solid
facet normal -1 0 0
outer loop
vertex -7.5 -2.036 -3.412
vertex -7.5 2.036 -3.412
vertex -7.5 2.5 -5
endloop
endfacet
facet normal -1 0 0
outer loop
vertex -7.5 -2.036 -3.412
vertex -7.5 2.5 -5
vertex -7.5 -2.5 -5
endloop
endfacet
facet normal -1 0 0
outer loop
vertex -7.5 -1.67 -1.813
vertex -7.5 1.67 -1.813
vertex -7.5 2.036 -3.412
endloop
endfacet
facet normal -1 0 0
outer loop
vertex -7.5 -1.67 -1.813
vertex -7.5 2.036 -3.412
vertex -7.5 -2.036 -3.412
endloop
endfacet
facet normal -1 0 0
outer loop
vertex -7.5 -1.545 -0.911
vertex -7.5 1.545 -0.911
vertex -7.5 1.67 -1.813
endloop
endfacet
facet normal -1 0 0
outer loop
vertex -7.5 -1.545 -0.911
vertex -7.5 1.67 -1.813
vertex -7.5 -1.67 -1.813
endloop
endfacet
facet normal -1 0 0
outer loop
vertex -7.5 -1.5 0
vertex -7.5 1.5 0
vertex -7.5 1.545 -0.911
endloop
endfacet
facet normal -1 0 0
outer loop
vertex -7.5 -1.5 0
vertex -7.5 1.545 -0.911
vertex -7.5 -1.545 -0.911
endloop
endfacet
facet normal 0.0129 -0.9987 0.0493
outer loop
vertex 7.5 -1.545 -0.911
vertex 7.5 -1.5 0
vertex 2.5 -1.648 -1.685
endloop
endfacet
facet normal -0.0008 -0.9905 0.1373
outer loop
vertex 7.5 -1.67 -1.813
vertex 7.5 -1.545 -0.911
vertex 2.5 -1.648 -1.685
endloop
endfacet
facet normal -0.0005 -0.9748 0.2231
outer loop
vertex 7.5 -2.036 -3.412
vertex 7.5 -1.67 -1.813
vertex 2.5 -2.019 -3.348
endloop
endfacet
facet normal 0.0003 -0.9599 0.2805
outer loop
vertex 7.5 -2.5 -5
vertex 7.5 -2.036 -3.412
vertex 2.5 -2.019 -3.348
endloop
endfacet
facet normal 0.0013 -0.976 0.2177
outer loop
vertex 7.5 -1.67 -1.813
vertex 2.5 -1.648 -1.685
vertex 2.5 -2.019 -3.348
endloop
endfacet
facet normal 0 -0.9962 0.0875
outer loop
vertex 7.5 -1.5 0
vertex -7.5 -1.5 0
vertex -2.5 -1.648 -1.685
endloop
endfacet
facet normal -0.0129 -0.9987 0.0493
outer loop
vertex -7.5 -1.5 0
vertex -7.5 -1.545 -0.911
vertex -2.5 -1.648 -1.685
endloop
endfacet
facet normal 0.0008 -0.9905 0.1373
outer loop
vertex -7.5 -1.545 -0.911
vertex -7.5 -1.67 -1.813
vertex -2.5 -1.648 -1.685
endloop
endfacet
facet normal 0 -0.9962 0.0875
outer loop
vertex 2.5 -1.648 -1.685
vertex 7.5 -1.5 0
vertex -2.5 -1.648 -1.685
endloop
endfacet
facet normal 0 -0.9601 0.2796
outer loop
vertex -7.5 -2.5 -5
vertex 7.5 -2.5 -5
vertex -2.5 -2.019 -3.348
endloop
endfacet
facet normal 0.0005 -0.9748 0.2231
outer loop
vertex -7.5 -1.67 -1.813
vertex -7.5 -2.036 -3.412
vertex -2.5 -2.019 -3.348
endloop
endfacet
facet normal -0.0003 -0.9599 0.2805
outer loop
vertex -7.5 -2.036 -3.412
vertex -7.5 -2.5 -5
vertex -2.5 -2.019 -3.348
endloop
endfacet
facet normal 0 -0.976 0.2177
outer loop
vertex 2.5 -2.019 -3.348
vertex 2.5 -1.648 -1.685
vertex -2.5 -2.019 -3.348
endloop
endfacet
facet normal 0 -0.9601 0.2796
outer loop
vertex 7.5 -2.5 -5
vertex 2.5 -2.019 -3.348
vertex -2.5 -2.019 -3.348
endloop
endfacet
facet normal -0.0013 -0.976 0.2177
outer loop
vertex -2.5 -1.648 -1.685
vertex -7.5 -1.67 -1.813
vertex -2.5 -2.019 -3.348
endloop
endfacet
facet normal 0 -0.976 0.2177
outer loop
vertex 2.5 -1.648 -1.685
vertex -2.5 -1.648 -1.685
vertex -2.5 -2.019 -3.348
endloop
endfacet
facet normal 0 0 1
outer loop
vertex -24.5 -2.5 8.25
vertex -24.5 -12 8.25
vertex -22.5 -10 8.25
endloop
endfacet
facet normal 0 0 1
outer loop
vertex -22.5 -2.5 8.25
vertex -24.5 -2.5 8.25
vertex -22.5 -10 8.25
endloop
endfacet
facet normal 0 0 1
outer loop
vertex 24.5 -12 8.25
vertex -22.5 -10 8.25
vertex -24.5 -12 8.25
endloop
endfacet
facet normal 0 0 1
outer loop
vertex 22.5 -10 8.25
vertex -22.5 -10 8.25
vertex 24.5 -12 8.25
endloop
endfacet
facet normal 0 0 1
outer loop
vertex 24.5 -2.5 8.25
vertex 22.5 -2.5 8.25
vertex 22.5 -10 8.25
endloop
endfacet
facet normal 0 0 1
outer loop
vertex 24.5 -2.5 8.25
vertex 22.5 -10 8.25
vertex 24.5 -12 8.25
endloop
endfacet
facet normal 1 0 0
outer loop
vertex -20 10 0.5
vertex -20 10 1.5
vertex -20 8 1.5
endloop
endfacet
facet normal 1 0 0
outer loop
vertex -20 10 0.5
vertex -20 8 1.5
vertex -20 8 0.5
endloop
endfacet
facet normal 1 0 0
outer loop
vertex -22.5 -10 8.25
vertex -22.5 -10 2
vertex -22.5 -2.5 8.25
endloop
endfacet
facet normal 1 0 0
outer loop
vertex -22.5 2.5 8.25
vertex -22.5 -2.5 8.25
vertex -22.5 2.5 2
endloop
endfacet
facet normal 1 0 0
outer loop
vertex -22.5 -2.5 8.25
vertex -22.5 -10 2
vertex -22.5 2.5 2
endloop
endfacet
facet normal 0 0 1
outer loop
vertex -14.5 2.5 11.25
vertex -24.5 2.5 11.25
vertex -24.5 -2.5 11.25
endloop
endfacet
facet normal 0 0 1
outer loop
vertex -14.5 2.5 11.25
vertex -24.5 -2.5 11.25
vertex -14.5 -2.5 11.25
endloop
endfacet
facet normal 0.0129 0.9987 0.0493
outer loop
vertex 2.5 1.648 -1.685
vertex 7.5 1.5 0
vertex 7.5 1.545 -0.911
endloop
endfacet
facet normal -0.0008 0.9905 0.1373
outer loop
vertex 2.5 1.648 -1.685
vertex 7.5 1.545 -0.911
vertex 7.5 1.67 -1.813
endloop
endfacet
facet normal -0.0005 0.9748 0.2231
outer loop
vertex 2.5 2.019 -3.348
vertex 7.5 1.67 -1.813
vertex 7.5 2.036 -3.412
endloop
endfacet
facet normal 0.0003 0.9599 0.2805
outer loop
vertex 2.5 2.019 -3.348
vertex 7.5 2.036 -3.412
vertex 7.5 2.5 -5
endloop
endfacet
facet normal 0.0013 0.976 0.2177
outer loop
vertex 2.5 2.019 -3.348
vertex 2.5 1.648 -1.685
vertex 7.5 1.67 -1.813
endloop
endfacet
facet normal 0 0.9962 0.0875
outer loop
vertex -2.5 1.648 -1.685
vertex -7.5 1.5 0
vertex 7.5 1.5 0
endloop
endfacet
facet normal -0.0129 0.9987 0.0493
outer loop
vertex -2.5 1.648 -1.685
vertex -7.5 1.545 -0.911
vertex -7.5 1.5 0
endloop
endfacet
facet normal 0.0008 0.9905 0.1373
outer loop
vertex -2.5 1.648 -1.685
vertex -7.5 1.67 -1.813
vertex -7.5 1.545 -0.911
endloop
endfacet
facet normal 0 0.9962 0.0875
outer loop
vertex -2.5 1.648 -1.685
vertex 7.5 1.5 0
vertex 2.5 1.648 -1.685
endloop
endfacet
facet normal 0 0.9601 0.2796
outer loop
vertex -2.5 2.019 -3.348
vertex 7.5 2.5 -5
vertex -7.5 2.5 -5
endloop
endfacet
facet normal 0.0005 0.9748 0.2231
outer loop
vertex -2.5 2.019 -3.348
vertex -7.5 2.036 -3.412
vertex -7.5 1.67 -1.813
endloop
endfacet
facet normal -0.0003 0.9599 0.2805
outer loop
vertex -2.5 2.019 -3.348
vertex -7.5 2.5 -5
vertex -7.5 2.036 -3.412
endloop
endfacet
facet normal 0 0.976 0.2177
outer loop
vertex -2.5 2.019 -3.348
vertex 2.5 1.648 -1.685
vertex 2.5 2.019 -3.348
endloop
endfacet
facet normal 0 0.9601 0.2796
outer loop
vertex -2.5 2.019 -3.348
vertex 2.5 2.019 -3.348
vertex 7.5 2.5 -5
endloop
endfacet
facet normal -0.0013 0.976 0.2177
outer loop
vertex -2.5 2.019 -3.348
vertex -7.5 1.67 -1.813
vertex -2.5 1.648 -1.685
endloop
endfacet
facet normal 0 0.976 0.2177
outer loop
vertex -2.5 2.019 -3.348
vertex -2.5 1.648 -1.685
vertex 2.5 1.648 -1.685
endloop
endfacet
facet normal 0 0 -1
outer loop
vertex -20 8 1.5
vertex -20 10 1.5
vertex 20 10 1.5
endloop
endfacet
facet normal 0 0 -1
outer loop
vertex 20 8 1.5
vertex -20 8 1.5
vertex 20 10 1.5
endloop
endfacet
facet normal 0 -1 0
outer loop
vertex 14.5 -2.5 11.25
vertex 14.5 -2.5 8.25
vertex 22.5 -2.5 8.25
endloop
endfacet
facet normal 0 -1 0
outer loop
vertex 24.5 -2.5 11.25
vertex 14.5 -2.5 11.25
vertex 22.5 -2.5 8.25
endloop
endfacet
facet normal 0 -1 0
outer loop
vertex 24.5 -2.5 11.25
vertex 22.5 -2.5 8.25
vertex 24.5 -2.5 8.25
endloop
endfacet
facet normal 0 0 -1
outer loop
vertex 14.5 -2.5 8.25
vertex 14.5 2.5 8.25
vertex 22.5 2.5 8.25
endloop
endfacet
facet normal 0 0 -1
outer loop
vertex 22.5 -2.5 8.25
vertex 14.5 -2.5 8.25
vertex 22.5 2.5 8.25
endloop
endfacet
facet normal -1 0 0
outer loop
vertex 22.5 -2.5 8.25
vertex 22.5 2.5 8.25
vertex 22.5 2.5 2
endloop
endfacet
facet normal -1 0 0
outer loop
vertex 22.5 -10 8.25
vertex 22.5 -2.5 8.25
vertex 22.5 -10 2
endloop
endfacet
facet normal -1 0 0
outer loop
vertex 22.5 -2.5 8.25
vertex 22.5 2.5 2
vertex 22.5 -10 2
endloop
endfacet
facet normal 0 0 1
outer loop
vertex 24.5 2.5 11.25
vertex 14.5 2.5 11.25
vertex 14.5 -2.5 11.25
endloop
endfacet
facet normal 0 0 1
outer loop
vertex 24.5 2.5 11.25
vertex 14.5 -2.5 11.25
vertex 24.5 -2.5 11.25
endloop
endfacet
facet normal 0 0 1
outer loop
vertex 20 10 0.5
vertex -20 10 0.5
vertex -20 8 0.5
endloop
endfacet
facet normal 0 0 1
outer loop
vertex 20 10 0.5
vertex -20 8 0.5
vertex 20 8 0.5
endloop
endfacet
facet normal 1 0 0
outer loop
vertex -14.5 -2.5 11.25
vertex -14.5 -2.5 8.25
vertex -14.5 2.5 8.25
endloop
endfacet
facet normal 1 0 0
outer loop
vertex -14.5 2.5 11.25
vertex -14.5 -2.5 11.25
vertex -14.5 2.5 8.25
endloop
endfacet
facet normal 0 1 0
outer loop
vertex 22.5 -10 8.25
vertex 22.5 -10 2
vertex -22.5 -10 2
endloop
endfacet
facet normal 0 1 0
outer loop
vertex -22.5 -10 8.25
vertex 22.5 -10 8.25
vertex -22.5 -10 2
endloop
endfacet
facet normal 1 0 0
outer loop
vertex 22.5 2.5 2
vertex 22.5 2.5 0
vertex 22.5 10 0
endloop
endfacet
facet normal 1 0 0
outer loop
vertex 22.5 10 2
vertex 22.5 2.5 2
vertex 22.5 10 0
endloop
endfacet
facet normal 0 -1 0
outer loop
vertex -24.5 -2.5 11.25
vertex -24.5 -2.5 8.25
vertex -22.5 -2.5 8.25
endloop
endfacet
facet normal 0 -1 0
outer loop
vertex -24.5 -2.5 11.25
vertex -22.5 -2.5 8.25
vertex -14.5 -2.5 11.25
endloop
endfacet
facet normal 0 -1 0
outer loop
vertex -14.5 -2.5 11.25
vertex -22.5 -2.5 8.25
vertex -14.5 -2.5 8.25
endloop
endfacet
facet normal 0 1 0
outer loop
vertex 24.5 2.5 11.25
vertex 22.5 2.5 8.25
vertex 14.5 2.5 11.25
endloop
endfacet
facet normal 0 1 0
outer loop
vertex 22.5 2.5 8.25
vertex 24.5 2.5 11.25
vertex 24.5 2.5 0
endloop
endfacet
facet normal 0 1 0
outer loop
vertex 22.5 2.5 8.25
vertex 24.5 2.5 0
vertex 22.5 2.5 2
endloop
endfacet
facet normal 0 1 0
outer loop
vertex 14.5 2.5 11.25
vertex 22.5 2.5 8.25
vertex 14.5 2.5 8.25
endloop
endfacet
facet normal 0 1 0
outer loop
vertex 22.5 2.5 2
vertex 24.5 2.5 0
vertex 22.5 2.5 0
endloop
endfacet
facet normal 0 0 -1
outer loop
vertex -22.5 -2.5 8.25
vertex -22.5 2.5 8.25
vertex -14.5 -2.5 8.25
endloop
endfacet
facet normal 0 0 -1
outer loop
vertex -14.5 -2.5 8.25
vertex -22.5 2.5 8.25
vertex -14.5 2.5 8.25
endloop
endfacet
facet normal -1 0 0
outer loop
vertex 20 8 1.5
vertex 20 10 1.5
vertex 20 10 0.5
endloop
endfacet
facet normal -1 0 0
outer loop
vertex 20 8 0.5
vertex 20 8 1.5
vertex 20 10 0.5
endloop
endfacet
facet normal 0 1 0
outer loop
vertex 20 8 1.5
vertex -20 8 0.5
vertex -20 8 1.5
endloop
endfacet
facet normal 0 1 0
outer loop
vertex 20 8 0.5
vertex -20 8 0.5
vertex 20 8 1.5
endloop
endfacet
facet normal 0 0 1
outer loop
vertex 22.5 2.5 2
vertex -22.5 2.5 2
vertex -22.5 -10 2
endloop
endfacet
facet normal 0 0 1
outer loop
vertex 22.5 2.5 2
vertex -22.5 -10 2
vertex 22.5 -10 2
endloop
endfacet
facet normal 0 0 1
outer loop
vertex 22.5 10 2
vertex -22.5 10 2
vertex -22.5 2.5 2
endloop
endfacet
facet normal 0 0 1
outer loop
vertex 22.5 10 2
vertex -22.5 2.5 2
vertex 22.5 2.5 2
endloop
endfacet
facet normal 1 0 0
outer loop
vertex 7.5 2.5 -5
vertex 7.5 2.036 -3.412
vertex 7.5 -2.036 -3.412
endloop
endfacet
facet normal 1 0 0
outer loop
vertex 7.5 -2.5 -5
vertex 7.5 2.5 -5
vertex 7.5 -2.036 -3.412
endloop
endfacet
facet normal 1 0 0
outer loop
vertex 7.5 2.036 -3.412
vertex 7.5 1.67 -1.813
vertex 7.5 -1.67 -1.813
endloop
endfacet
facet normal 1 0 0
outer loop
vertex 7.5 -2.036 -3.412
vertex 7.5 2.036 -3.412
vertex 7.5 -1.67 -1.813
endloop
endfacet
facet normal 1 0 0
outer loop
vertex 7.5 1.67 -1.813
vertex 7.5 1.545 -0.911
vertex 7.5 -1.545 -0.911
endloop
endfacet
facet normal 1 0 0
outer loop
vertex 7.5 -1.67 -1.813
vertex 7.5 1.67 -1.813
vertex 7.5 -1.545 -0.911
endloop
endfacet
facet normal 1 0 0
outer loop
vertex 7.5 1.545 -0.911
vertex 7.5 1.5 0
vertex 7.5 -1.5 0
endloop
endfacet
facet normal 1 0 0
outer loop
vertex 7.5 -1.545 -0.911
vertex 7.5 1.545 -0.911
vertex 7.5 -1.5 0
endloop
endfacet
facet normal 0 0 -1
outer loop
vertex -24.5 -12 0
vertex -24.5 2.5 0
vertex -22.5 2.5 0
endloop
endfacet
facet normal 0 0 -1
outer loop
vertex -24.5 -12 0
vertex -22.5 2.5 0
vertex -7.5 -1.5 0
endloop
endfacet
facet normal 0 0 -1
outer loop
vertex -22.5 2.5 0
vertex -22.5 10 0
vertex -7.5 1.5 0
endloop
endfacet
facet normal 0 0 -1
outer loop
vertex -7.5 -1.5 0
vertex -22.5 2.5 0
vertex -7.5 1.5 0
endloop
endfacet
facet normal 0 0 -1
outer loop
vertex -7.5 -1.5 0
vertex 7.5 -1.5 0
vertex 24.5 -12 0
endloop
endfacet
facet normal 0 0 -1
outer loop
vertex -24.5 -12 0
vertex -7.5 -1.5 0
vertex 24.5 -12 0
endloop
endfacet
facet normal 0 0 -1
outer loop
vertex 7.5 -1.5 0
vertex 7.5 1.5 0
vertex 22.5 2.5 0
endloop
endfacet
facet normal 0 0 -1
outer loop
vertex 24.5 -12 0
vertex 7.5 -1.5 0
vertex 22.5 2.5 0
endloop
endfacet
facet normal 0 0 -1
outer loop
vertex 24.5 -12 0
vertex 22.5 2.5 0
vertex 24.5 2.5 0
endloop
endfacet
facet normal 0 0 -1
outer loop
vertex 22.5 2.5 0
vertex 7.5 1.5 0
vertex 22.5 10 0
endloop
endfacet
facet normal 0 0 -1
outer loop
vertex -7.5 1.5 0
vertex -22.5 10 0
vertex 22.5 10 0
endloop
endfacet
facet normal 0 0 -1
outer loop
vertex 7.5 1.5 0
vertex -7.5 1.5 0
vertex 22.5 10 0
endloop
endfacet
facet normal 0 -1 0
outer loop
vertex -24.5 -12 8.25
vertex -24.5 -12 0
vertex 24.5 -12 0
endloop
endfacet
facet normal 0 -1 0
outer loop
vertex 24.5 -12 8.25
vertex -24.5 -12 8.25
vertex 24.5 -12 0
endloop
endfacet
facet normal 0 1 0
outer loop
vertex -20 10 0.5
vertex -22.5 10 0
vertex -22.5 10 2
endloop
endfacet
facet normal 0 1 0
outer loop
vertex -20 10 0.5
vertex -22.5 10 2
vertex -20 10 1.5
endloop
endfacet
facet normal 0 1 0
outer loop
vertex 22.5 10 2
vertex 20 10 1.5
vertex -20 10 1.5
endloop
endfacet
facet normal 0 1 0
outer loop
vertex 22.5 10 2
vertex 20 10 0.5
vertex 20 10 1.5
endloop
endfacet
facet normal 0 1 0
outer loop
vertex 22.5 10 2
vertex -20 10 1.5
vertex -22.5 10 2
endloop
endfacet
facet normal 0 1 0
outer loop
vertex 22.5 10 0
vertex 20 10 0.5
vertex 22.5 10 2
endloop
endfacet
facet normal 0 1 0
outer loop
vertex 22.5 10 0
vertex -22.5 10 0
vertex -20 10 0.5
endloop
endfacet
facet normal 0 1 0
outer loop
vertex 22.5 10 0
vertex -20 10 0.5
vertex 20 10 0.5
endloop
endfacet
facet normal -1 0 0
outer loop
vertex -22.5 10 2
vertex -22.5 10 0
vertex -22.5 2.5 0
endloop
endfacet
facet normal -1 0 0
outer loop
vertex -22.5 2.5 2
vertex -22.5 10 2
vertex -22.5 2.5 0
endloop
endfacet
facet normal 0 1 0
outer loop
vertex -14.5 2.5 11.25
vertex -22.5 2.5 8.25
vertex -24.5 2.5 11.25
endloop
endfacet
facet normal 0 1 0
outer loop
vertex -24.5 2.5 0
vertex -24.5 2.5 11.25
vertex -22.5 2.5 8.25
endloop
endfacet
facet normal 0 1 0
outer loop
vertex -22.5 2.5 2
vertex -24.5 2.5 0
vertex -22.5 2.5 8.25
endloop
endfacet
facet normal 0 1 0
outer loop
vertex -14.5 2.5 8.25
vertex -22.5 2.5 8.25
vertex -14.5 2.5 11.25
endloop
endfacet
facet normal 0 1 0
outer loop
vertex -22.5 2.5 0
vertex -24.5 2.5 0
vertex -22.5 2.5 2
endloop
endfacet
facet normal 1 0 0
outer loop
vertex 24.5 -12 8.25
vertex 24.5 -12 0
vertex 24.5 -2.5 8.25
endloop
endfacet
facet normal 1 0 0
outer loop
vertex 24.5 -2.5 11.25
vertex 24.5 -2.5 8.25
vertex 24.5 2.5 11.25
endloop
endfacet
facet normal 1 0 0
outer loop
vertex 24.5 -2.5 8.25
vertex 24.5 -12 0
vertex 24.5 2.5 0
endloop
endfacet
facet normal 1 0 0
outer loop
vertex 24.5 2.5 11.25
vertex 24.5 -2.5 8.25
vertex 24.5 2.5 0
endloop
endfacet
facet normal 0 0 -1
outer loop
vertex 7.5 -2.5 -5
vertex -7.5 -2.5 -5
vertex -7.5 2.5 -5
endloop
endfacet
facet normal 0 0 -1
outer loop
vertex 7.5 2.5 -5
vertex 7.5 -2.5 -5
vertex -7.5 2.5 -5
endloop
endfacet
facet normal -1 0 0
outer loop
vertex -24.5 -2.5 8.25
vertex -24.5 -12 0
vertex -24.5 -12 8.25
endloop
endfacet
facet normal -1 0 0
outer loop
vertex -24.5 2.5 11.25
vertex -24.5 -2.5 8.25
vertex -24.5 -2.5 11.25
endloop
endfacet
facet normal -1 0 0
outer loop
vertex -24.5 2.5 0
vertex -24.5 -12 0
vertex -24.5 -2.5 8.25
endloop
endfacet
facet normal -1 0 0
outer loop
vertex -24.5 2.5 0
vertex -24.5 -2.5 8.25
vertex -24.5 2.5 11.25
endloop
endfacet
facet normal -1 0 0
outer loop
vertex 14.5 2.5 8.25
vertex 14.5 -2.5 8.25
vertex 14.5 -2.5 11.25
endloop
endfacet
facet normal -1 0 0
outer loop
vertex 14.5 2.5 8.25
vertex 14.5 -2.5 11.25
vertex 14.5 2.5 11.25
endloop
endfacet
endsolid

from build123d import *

# Parameters (mm, degrees)
SKETCH1_W           = 45
SKETCH1_H           = 7.5
SKETCH1_H_2         = 12.5
BOSS_EXTRUDE1_DEPTH = 2
BOSS_EXTRUDE2_DEPTH = 8.25
SKETCH3_W           = 10
SKETCH3_H           = 5
BOSS_EXTRUDE3_DEPTH = 3
SKETCH4_W           = 40
SKETCH4_H           = 1
CUT_EXTRUDE1_DEPTH  = 2
LOFT2_START         = -7.5
LOFT2_DEPTH         = 15


# Read off the part's stored shape, not the designer's step: Loft2
with BuildPart() as part:
    # Sketch1 → Boss-Extrude1 (new body)
    with BuildSketch(Plane.XY):
        with Locations((0, 6.25)):
            Rectangle(SKETCH1_W, SKETCH1_H)
        with Locations((0, -3.75)):
            Rectangle(SKETCH1_W, SKETCH1_H_2)
    extrude(amount=BOSS_EXTRUDE1_DEPTH)

    # Sketch1<3> → Boss-Extrude2 (add)
    with BuildSketch(Plane.XY):
        Polygon((-22.5, 2.5), (-24.5, 2.5), (-24.5, -12), (24.5, -12), (24.5, 2.5), (22.5, 2.5), (22.5, -10), (-22.5, -10), align=None)
    extrude(amount=BOSS_EXTRUDE2_DEPTH)

    # Sketch3 → Boss-Extrude3 (add)
    with BuildSketch(Plane.XY.offset(8.25)):
        with Locations((-19.5, 0)):
            Rectangle(SKETCH3_W, SKETCH3_H)
        with Locations((19.5, 0)):
            Rectangle(SKETCH3_W, SKETCH3_H)
    extrude(amount=BOSS_EXTRUDE3_DEPTH)

    # Sketch4 → Cut-Extrude1 (cut)
    with BuildSketch(Plane(origin=(0, 10, 0), x_dir=(1, 0, 0), z_dir=(0, 1, 0))):
        with Locations((0, -1)):
            Rectangle(SKETCH4_W, SKETCH4_H)
    extrude(amount=-CUT_EXTRUDE1_DEPTH, mode=Mode.SUBTRACT)

    # Loft2 outline → Loft2 (add)
    with BuildSketch(Plane.YZ.offset(LOFT2_START)):
        with BuildLine():
            add(Edge.make_bspline(
                [(1.5, 0), (1.5, -1.699673171), (2, -3.349836586), (2.5, -5)],
                knots=[0, 0, 0, 0, 1, 1, 1, 1], degree=3))
            Line((1.5, 0), (-1.5, 0))
            add(Edge.make_bspline(
                [(-1.5, 0), (-1.5, -1.699673171), (-2, -3.349836586), (-2.5, -5)],
                knots=[0, 0, 0, 0, 1, 1, 1, 1], degree=3))
            Line((-2.5, -5), (2.5, -5))
        make_face()
    extrude(amount=LOFT2_DEPTH)


solid = part.part
